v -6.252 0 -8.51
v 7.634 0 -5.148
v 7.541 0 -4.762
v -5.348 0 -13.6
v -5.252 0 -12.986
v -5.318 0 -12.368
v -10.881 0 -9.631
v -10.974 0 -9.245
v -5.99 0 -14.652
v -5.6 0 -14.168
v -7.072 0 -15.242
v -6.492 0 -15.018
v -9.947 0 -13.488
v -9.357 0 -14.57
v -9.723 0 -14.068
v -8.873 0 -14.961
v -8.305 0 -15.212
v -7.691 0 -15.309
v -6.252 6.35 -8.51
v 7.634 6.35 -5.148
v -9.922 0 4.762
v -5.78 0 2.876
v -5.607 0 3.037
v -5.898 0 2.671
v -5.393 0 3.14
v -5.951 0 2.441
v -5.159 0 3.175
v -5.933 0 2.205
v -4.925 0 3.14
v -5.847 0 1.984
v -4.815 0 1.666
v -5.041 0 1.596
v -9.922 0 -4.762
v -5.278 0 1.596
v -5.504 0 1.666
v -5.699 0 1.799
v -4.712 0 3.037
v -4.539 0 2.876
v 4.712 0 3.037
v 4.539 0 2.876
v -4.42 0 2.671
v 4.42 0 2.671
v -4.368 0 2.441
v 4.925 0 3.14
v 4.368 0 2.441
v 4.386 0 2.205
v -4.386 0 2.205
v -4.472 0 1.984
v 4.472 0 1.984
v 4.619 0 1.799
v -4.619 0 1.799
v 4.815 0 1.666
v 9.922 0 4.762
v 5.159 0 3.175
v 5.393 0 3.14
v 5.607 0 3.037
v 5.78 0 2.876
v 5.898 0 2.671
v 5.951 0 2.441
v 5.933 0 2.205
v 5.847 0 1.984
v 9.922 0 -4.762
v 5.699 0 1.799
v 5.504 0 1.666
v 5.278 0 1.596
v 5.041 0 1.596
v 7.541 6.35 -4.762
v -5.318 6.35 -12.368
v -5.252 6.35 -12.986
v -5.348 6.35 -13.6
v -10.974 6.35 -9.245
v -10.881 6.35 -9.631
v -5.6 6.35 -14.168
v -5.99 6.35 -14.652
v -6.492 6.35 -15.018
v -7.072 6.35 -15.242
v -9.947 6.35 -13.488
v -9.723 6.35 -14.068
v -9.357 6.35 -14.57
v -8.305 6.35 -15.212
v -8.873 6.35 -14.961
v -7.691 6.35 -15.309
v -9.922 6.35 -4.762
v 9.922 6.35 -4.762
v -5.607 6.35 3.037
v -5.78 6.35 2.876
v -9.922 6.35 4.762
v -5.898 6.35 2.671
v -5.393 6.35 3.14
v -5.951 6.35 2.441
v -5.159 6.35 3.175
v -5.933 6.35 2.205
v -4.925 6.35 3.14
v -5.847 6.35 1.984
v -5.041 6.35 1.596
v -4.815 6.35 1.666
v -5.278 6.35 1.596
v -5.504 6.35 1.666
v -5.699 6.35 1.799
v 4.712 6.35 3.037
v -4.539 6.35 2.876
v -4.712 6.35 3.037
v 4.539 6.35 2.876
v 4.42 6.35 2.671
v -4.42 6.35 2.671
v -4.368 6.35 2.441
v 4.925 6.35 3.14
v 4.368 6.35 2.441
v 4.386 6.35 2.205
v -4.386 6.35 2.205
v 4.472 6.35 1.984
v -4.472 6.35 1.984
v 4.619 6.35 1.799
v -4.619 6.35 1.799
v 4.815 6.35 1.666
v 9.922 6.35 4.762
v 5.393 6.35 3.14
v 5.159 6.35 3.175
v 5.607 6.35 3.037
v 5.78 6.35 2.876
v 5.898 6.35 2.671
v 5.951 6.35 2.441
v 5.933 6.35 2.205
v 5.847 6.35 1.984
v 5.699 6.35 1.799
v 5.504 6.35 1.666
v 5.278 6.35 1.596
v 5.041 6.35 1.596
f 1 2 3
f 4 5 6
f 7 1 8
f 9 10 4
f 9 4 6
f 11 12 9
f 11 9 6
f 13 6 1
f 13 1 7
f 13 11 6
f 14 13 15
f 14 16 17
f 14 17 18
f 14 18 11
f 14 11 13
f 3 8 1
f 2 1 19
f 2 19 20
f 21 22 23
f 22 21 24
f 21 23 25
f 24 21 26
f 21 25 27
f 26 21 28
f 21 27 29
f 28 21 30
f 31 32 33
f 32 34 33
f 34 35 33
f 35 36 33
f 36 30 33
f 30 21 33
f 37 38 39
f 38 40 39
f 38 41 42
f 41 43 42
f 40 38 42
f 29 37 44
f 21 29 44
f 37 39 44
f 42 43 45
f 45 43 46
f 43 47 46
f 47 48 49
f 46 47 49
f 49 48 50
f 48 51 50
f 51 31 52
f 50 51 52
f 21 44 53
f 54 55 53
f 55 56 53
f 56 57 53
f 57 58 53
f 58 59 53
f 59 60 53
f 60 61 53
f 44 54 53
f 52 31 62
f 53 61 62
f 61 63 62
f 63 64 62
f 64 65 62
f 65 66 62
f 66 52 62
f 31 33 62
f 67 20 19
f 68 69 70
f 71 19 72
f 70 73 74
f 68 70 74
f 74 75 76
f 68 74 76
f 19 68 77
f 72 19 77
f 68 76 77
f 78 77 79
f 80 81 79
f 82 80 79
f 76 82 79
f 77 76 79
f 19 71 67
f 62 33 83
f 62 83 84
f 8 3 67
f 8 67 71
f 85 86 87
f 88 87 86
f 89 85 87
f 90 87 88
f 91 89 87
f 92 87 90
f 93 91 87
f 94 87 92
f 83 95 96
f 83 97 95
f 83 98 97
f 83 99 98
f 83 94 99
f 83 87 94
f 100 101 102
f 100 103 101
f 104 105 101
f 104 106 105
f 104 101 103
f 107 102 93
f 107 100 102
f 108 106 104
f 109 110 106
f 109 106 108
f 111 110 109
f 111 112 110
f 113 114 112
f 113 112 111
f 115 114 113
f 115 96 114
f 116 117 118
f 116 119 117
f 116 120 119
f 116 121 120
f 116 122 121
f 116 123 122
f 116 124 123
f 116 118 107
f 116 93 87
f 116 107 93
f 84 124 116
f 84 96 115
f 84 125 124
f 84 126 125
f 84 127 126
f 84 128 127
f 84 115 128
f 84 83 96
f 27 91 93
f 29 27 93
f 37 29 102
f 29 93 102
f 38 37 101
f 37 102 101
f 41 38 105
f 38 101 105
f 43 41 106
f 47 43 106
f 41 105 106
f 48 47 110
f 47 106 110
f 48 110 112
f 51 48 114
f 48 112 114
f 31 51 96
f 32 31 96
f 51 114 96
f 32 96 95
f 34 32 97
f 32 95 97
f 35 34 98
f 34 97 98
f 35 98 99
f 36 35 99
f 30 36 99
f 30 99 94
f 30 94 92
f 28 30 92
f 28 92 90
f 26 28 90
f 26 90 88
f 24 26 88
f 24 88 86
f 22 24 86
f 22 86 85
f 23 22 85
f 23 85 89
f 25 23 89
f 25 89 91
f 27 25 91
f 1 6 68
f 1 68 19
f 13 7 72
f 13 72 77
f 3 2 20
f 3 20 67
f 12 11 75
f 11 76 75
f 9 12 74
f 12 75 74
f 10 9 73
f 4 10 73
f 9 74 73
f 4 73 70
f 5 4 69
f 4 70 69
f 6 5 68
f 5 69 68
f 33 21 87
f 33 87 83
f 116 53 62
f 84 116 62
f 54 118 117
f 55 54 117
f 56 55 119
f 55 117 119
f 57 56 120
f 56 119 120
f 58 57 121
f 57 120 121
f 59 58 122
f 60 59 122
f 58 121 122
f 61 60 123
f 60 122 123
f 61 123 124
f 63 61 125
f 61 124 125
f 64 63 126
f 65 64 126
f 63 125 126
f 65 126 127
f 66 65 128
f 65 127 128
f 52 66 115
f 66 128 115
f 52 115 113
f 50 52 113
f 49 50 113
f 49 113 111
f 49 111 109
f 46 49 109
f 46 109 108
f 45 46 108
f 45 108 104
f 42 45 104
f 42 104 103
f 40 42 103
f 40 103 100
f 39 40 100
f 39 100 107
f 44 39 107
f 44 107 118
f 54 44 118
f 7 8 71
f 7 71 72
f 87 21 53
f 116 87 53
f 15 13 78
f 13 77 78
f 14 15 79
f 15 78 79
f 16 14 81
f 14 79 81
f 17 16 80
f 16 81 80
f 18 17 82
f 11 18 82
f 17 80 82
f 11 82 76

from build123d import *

# Parameters (mm, degrees)
SKETCH1_W           = 19.84375
SKETCH1_H           = 9.525
BOSS_EXTRUDE1_DEPTH = 6.35
SKETCH2_R           = 0.79375
CUT_EXTRUDE1_DEPTH  = 13.706199659
BOSS_EXTRUDE2_DEPTH = 6.35
FILLET1_R           = 2.38125


with BuildPart() as part:
    # Sketch1 → Boss-Extrude1 (new body)
    with BuildSketch(Plane(origin=(0, 0, 0), x_dir=(1, 0, 0), z_dir=(0, 1, 0))):
        Rectangle(SKETCH1_W, SKETCH1_H)
    extrude(amount=BOSS_EXTRUDE1_DEPTH)

    # Sketch2 → Cut-Extrude1 (cut, through all)
    with BuildSketch(Plane(origin=(0, 6.35, 0), x_dir=(1, 0, 0), z_dir=(0, 1, 0))):
        with Locations(Location((-5.159375, -2.38125, 0), (0, 0, 270))):
            Circle(SKETCH2_R)
        with Locations(Location((5.159375, -2.38125, 0), (0, 0, 270))):
            Circle(SKETCH2_R)
    extrude(amount=-CUT_EXTRUDE1_DEPTH, mode=Mode.SUBTRACT)


with BuildPart() as body_2:
    # Sketch3 → Boss-Extrude2 (new body)
    with BuildSketch(Plane(origin=(0, 0, 0), x_dir=(1, 0, 0), z_dir=(0, 1, 0))):
        Polygon((7.540625, 4.7625), (-10.974426706, 9.245284885), (-10.881035354, 9.631015129), (-9.386773726, 15.802699031), (-4.758010799, 14.68200281), (-6.252272428, 8.510318908), (7.634016352, 5.148230244), align=None)
    extrude(amount=BOSS_EXTRUDE2_DEPTH)

    # Fillet1
    fillet1_edges = [body_2.edges().sort_by_distance(p)[0] for p in [
        (-4.758010799, 3.175, -14.68200281),
        (-9.386773726, 3.175, -15.802699031),
    ]]
    fillet(fillet1_edges, radius=FILLET1_R - 0.0001)  # a hair under: the kernel refuses the full size


solid = Compound([part.part, body_2.part])
